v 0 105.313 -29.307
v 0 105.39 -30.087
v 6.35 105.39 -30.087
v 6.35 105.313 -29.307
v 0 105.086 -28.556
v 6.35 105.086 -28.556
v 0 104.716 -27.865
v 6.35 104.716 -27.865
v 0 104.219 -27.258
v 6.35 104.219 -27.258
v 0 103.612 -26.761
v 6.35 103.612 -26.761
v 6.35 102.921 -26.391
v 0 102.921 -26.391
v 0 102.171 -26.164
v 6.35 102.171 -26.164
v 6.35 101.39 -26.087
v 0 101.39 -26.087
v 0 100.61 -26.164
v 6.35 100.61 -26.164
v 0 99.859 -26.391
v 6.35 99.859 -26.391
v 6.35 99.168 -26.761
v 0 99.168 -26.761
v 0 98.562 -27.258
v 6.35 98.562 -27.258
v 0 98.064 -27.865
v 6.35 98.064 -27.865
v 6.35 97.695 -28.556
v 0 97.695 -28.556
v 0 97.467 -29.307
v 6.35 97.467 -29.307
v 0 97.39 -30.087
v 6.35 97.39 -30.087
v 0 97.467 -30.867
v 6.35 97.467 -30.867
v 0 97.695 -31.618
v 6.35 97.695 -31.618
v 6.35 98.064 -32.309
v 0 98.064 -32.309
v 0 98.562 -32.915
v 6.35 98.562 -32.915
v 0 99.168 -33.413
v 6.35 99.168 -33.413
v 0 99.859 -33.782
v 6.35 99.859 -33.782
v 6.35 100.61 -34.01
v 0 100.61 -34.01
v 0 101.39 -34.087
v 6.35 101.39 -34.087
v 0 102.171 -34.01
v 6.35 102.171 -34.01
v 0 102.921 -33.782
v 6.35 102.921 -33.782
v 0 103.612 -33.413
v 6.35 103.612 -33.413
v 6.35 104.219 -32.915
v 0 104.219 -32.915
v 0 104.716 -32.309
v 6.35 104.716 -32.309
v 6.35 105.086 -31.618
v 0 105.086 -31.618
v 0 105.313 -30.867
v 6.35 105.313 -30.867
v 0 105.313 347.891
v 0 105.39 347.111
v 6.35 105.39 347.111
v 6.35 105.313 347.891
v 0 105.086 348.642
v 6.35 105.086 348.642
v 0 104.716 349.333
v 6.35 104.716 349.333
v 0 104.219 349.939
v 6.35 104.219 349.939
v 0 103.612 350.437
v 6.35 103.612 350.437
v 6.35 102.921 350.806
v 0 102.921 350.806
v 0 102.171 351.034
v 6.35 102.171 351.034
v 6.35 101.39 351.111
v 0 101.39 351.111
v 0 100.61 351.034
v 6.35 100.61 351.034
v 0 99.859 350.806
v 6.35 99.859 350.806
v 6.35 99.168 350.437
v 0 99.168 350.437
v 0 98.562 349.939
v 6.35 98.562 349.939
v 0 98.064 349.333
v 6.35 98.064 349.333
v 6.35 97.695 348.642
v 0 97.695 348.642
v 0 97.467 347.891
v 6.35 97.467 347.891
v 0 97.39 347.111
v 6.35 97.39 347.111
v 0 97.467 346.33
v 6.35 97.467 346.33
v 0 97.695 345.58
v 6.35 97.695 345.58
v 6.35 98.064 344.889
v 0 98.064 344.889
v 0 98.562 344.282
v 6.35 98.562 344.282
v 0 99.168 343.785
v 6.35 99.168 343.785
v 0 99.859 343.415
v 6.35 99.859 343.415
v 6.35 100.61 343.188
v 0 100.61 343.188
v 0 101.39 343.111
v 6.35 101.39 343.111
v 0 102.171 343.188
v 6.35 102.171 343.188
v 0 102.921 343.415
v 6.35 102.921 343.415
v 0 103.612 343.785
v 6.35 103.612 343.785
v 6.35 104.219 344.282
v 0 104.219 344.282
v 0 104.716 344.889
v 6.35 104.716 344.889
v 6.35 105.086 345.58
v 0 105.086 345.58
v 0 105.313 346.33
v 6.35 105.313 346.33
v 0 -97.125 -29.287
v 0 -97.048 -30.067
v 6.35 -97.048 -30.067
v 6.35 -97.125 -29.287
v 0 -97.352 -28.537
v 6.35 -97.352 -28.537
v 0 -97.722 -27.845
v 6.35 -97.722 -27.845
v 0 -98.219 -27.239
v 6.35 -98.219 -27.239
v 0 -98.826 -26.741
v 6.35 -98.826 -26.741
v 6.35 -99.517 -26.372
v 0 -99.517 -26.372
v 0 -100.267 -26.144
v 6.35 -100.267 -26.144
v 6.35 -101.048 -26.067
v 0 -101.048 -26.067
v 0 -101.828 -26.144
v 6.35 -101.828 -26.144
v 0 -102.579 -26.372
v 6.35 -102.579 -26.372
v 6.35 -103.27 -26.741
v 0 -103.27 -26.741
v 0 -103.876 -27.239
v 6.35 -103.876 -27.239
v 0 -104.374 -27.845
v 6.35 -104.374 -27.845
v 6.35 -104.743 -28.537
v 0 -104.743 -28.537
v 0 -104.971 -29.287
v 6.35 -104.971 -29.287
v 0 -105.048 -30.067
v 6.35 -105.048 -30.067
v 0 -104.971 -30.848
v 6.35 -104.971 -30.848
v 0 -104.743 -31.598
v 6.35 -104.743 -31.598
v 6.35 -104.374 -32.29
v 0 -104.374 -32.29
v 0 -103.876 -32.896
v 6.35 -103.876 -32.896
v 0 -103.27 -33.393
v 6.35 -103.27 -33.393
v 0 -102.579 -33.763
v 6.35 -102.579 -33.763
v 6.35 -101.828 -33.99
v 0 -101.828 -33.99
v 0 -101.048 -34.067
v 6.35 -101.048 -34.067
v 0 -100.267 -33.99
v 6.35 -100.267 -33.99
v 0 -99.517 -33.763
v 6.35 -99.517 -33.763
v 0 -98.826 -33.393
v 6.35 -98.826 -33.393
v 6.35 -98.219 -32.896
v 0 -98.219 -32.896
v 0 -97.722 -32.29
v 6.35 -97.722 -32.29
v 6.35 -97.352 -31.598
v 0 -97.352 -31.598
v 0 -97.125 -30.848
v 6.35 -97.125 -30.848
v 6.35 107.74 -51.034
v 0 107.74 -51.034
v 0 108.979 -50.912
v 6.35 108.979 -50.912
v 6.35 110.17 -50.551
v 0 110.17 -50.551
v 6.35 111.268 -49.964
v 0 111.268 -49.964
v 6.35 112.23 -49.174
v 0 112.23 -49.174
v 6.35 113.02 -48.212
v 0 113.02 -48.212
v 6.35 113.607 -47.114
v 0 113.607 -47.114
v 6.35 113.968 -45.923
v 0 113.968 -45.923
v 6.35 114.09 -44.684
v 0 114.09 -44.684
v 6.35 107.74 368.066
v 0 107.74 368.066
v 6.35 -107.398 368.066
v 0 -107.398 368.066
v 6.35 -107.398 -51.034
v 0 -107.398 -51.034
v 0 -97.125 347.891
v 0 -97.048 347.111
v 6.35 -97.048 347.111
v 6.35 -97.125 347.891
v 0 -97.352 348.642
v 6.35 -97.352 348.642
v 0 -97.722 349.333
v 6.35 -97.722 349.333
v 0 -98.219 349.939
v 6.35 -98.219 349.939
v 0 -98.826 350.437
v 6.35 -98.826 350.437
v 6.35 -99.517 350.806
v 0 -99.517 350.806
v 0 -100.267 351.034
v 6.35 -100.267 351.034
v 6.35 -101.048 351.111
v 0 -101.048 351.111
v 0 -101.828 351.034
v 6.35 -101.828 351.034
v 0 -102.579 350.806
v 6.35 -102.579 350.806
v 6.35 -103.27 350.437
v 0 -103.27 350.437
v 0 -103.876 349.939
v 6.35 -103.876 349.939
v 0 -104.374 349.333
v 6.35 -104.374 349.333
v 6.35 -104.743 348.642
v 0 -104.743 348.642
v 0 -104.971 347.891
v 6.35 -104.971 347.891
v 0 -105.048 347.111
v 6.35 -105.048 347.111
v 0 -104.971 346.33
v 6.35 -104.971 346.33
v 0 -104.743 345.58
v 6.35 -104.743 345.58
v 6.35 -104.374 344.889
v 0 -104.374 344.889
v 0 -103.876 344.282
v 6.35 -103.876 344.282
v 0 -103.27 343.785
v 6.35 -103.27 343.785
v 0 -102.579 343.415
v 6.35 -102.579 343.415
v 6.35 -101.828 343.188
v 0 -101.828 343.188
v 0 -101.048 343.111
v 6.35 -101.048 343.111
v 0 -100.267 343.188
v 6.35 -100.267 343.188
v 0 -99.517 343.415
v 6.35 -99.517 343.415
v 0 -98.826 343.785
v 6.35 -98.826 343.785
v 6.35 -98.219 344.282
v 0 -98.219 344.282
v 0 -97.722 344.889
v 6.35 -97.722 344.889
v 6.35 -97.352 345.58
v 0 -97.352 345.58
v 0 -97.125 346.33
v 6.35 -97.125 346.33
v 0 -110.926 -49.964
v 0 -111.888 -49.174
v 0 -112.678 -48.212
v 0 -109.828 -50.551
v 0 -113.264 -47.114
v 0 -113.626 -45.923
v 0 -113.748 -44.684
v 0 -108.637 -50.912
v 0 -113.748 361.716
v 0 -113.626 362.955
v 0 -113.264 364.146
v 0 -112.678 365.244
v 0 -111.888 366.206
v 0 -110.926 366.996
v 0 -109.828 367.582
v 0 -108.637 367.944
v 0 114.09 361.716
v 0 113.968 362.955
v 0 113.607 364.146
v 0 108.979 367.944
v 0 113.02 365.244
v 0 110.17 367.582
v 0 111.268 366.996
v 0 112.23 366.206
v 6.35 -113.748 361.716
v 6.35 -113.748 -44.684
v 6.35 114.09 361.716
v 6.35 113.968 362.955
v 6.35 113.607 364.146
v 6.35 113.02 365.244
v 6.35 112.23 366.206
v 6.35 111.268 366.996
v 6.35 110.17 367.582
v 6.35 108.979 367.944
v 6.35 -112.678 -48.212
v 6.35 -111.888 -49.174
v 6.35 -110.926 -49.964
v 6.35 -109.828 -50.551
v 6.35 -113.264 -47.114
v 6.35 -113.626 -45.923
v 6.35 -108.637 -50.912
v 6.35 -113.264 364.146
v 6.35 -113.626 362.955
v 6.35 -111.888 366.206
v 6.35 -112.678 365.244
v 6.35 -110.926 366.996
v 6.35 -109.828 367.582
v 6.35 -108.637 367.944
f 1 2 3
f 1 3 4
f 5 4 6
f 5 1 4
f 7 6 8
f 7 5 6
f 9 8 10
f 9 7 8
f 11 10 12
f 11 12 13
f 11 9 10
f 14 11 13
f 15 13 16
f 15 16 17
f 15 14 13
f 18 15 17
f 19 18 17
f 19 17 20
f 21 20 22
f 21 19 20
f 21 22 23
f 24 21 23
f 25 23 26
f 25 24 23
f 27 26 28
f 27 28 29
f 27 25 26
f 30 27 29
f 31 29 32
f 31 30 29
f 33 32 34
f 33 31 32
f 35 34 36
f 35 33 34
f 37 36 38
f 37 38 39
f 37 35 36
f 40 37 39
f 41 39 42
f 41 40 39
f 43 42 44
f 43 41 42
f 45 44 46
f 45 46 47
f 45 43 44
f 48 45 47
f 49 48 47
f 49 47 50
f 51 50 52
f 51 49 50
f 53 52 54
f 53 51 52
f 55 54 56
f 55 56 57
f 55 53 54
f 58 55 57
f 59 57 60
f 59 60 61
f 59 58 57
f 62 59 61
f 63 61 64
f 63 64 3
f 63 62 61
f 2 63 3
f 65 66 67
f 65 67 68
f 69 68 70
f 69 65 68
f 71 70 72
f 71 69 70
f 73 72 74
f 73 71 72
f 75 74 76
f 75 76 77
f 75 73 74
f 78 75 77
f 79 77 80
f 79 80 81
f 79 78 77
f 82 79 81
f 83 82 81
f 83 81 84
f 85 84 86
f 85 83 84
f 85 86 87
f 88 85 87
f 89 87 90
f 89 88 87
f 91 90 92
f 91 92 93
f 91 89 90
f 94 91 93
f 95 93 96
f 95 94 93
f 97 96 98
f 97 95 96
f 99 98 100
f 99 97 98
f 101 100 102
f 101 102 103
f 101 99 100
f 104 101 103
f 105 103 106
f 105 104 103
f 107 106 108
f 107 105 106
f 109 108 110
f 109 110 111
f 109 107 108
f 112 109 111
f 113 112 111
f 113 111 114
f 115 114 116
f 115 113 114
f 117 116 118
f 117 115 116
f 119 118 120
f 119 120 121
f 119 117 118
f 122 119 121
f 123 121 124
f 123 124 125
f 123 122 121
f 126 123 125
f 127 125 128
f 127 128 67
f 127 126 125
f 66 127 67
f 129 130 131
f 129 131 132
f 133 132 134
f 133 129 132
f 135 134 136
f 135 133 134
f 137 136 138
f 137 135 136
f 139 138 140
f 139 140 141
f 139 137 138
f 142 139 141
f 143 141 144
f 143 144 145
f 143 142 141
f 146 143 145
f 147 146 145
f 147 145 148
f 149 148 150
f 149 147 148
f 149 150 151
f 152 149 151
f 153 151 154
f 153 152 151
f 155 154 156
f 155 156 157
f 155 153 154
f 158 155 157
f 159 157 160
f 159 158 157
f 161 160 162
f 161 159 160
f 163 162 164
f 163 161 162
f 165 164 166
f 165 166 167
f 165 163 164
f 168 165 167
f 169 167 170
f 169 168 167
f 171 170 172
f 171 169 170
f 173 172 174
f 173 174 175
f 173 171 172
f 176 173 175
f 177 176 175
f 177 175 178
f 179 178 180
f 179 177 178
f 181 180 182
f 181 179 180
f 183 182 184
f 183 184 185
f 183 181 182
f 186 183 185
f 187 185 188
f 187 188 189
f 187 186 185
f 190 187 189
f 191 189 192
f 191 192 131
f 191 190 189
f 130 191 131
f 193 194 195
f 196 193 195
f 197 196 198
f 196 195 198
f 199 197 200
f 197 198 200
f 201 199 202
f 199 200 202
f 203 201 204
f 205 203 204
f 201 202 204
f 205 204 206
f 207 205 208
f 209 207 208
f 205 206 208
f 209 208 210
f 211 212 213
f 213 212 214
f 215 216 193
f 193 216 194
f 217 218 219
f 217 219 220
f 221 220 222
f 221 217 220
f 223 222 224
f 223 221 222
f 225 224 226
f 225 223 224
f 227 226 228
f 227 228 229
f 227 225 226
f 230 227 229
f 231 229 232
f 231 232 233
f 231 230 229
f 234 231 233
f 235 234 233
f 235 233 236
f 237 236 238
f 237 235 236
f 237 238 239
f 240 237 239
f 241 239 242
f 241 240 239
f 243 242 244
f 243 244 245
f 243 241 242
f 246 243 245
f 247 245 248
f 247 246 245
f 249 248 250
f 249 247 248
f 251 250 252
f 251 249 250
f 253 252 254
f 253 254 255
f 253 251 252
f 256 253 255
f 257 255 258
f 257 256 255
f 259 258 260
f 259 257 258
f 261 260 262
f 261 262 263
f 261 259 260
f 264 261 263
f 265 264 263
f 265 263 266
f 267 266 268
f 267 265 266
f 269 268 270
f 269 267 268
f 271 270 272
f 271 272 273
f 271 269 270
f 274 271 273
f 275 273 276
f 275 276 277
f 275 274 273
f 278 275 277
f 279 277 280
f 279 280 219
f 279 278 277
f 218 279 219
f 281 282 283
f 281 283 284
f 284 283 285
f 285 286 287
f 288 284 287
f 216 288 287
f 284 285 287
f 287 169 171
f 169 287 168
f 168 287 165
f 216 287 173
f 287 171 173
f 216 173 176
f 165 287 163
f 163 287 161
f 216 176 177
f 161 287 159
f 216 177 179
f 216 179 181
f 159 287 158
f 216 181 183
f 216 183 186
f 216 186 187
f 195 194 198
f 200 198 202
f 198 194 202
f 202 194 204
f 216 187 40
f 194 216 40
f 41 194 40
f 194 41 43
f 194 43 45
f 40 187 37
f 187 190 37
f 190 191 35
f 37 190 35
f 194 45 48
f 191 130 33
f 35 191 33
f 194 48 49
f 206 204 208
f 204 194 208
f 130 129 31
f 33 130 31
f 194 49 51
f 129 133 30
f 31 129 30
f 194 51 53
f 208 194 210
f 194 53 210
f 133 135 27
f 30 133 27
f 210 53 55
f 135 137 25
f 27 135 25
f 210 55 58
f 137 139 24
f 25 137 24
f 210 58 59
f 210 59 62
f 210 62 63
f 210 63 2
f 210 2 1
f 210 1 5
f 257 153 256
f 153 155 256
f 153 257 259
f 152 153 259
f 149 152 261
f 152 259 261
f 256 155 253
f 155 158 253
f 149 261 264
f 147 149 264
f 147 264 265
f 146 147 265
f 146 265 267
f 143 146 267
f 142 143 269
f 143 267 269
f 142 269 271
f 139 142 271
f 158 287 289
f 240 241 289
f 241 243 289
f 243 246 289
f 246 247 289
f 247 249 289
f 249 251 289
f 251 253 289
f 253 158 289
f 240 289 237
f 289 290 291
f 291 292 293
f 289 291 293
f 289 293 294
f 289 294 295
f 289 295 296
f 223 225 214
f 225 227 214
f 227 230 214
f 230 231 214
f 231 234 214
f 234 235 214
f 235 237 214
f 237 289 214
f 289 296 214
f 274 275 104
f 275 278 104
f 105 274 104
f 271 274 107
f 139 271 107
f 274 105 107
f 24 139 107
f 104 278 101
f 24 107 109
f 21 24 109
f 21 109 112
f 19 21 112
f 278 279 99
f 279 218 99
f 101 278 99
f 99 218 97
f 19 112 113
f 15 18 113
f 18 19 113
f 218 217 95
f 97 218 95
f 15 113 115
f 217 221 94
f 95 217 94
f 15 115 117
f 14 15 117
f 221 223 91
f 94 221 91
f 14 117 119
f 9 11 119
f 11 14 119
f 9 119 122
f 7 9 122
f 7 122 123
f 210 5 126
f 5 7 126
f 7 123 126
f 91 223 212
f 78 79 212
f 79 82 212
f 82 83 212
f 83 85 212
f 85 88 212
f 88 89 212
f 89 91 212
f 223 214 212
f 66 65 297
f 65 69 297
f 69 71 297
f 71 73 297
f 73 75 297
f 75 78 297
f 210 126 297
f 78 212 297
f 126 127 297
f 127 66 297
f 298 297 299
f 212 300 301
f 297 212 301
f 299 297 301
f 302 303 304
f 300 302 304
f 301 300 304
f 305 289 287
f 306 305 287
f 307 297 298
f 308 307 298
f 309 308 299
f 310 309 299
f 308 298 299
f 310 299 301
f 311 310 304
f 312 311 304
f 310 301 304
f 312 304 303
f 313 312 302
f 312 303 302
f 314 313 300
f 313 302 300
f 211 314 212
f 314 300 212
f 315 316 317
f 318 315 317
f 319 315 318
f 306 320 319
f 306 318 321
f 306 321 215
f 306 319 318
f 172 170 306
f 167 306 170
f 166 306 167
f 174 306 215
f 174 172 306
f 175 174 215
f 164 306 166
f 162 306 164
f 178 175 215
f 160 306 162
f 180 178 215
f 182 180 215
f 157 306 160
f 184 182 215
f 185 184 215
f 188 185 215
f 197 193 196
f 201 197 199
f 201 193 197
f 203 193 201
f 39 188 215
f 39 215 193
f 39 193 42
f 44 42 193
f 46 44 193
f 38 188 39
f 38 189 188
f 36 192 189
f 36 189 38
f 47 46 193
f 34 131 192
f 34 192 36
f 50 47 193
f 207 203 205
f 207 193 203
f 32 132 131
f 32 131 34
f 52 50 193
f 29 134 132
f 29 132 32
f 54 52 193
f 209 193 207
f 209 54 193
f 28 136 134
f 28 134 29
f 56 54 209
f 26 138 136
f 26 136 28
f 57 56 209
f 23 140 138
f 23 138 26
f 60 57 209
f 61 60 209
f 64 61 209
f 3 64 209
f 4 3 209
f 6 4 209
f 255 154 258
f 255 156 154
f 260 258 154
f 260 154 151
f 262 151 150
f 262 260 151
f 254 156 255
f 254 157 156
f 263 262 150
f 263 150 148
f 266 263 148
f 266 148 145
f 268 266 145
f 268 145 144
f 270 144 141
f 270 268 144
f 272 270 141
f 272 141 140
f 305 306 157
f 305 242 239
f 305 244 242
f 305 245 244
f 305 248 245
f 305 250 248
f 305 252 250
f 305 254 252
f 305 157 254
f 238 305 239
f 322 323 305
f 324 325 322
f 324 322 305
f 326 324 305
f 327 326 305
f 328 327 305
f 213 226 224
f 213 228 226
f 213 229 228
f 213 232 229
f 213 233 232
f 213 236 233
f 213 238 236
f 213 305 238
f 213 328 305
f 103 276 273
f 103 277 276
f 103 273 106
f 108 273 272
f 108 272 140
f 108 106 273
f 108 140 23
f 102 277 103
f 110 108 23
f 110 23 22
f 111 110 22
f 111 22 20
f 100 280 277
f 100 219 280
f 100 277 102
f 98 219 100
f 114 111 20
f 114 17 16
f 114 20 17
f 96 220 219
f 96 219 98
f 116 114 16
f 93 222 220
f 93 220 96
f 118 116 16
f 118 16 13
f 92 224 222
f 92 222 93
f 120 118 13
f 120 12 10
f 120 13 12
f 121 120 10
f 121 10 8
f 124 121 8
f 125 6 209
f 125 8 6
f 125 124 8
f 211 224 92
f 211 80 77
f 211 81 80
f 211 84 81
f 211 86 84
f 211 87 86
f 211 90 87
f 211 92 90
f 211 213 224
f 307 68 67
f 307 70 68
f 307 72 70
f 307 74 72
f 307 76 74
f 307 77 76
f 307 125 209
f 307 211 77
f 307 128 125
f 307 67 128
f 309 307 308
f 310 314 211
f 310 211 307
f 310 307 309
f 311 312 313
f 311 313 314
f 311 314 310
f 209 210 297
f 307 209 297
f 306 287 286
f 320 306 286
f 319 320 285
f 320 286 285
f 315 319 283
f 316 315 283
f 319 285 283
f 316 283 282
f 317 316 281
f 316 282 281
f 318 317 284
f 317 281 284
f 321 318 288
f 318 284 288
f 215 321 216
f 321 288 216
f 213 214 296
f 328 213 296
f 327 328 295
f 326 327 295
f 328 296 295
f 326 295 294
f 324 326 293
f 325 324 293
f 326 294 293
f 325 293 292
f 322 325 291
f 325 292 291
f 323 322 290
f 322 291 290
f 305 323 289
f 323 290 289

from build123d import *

# Parameters (mm, degrees)
F0_R     = 4
F1_DEPTH = 6.35


with BuildPart() as f1:
    # F0 (on Right) → F1 (new body)
    with BuildSketch(Plane.YZ):
        with BuildLine():
            Line((107.740174, 368.065851), (-107.397826, 368.065851))
            ThreePointArc((-107.397826, 368.065851), (-111.887954, 366.205979), (-113.747826, 361.715851))
            Line((-113.747826, 361.715851), (-113.747826, -44.684149))
            ThreePointArc((-113.747826, -44.684149), (-111.887954, -49.174277), (-107.397826, -51.034149))
            Line((-107.397826, -51.034149), (107.740174, -51.034149))
            ThreePointArc((107.740174, -51.034149), (112.230302, -49.174277), (114.090174, -44.684149))
            Line((114.090174, -44.684149), (114.090174, 361.715851))
            ThreePointArc((114.090174, 361.715851), (112.230302, 366.205979), (107.740174, 368.065851))
        make_face()
        with Locations((-101.047826, -30.067328)):
            Circle(F0_R, mode=Mode.SUBTRACT)
        with Locations((101.390174, -30.086907)):
            Circle(F0_R, mode=Mode.SUBTRACT)
        with Locations((-101.047826, 347.110851)):
            Circle(F0_R, mode=Mode.SUBTRACT)
        with Locations((101.390174, 347.110851)):
            Circle(F0_R, mode=Mode.SUBTRACT)
    extrude(amount=F1_DEPTH)


solid = f1.part
